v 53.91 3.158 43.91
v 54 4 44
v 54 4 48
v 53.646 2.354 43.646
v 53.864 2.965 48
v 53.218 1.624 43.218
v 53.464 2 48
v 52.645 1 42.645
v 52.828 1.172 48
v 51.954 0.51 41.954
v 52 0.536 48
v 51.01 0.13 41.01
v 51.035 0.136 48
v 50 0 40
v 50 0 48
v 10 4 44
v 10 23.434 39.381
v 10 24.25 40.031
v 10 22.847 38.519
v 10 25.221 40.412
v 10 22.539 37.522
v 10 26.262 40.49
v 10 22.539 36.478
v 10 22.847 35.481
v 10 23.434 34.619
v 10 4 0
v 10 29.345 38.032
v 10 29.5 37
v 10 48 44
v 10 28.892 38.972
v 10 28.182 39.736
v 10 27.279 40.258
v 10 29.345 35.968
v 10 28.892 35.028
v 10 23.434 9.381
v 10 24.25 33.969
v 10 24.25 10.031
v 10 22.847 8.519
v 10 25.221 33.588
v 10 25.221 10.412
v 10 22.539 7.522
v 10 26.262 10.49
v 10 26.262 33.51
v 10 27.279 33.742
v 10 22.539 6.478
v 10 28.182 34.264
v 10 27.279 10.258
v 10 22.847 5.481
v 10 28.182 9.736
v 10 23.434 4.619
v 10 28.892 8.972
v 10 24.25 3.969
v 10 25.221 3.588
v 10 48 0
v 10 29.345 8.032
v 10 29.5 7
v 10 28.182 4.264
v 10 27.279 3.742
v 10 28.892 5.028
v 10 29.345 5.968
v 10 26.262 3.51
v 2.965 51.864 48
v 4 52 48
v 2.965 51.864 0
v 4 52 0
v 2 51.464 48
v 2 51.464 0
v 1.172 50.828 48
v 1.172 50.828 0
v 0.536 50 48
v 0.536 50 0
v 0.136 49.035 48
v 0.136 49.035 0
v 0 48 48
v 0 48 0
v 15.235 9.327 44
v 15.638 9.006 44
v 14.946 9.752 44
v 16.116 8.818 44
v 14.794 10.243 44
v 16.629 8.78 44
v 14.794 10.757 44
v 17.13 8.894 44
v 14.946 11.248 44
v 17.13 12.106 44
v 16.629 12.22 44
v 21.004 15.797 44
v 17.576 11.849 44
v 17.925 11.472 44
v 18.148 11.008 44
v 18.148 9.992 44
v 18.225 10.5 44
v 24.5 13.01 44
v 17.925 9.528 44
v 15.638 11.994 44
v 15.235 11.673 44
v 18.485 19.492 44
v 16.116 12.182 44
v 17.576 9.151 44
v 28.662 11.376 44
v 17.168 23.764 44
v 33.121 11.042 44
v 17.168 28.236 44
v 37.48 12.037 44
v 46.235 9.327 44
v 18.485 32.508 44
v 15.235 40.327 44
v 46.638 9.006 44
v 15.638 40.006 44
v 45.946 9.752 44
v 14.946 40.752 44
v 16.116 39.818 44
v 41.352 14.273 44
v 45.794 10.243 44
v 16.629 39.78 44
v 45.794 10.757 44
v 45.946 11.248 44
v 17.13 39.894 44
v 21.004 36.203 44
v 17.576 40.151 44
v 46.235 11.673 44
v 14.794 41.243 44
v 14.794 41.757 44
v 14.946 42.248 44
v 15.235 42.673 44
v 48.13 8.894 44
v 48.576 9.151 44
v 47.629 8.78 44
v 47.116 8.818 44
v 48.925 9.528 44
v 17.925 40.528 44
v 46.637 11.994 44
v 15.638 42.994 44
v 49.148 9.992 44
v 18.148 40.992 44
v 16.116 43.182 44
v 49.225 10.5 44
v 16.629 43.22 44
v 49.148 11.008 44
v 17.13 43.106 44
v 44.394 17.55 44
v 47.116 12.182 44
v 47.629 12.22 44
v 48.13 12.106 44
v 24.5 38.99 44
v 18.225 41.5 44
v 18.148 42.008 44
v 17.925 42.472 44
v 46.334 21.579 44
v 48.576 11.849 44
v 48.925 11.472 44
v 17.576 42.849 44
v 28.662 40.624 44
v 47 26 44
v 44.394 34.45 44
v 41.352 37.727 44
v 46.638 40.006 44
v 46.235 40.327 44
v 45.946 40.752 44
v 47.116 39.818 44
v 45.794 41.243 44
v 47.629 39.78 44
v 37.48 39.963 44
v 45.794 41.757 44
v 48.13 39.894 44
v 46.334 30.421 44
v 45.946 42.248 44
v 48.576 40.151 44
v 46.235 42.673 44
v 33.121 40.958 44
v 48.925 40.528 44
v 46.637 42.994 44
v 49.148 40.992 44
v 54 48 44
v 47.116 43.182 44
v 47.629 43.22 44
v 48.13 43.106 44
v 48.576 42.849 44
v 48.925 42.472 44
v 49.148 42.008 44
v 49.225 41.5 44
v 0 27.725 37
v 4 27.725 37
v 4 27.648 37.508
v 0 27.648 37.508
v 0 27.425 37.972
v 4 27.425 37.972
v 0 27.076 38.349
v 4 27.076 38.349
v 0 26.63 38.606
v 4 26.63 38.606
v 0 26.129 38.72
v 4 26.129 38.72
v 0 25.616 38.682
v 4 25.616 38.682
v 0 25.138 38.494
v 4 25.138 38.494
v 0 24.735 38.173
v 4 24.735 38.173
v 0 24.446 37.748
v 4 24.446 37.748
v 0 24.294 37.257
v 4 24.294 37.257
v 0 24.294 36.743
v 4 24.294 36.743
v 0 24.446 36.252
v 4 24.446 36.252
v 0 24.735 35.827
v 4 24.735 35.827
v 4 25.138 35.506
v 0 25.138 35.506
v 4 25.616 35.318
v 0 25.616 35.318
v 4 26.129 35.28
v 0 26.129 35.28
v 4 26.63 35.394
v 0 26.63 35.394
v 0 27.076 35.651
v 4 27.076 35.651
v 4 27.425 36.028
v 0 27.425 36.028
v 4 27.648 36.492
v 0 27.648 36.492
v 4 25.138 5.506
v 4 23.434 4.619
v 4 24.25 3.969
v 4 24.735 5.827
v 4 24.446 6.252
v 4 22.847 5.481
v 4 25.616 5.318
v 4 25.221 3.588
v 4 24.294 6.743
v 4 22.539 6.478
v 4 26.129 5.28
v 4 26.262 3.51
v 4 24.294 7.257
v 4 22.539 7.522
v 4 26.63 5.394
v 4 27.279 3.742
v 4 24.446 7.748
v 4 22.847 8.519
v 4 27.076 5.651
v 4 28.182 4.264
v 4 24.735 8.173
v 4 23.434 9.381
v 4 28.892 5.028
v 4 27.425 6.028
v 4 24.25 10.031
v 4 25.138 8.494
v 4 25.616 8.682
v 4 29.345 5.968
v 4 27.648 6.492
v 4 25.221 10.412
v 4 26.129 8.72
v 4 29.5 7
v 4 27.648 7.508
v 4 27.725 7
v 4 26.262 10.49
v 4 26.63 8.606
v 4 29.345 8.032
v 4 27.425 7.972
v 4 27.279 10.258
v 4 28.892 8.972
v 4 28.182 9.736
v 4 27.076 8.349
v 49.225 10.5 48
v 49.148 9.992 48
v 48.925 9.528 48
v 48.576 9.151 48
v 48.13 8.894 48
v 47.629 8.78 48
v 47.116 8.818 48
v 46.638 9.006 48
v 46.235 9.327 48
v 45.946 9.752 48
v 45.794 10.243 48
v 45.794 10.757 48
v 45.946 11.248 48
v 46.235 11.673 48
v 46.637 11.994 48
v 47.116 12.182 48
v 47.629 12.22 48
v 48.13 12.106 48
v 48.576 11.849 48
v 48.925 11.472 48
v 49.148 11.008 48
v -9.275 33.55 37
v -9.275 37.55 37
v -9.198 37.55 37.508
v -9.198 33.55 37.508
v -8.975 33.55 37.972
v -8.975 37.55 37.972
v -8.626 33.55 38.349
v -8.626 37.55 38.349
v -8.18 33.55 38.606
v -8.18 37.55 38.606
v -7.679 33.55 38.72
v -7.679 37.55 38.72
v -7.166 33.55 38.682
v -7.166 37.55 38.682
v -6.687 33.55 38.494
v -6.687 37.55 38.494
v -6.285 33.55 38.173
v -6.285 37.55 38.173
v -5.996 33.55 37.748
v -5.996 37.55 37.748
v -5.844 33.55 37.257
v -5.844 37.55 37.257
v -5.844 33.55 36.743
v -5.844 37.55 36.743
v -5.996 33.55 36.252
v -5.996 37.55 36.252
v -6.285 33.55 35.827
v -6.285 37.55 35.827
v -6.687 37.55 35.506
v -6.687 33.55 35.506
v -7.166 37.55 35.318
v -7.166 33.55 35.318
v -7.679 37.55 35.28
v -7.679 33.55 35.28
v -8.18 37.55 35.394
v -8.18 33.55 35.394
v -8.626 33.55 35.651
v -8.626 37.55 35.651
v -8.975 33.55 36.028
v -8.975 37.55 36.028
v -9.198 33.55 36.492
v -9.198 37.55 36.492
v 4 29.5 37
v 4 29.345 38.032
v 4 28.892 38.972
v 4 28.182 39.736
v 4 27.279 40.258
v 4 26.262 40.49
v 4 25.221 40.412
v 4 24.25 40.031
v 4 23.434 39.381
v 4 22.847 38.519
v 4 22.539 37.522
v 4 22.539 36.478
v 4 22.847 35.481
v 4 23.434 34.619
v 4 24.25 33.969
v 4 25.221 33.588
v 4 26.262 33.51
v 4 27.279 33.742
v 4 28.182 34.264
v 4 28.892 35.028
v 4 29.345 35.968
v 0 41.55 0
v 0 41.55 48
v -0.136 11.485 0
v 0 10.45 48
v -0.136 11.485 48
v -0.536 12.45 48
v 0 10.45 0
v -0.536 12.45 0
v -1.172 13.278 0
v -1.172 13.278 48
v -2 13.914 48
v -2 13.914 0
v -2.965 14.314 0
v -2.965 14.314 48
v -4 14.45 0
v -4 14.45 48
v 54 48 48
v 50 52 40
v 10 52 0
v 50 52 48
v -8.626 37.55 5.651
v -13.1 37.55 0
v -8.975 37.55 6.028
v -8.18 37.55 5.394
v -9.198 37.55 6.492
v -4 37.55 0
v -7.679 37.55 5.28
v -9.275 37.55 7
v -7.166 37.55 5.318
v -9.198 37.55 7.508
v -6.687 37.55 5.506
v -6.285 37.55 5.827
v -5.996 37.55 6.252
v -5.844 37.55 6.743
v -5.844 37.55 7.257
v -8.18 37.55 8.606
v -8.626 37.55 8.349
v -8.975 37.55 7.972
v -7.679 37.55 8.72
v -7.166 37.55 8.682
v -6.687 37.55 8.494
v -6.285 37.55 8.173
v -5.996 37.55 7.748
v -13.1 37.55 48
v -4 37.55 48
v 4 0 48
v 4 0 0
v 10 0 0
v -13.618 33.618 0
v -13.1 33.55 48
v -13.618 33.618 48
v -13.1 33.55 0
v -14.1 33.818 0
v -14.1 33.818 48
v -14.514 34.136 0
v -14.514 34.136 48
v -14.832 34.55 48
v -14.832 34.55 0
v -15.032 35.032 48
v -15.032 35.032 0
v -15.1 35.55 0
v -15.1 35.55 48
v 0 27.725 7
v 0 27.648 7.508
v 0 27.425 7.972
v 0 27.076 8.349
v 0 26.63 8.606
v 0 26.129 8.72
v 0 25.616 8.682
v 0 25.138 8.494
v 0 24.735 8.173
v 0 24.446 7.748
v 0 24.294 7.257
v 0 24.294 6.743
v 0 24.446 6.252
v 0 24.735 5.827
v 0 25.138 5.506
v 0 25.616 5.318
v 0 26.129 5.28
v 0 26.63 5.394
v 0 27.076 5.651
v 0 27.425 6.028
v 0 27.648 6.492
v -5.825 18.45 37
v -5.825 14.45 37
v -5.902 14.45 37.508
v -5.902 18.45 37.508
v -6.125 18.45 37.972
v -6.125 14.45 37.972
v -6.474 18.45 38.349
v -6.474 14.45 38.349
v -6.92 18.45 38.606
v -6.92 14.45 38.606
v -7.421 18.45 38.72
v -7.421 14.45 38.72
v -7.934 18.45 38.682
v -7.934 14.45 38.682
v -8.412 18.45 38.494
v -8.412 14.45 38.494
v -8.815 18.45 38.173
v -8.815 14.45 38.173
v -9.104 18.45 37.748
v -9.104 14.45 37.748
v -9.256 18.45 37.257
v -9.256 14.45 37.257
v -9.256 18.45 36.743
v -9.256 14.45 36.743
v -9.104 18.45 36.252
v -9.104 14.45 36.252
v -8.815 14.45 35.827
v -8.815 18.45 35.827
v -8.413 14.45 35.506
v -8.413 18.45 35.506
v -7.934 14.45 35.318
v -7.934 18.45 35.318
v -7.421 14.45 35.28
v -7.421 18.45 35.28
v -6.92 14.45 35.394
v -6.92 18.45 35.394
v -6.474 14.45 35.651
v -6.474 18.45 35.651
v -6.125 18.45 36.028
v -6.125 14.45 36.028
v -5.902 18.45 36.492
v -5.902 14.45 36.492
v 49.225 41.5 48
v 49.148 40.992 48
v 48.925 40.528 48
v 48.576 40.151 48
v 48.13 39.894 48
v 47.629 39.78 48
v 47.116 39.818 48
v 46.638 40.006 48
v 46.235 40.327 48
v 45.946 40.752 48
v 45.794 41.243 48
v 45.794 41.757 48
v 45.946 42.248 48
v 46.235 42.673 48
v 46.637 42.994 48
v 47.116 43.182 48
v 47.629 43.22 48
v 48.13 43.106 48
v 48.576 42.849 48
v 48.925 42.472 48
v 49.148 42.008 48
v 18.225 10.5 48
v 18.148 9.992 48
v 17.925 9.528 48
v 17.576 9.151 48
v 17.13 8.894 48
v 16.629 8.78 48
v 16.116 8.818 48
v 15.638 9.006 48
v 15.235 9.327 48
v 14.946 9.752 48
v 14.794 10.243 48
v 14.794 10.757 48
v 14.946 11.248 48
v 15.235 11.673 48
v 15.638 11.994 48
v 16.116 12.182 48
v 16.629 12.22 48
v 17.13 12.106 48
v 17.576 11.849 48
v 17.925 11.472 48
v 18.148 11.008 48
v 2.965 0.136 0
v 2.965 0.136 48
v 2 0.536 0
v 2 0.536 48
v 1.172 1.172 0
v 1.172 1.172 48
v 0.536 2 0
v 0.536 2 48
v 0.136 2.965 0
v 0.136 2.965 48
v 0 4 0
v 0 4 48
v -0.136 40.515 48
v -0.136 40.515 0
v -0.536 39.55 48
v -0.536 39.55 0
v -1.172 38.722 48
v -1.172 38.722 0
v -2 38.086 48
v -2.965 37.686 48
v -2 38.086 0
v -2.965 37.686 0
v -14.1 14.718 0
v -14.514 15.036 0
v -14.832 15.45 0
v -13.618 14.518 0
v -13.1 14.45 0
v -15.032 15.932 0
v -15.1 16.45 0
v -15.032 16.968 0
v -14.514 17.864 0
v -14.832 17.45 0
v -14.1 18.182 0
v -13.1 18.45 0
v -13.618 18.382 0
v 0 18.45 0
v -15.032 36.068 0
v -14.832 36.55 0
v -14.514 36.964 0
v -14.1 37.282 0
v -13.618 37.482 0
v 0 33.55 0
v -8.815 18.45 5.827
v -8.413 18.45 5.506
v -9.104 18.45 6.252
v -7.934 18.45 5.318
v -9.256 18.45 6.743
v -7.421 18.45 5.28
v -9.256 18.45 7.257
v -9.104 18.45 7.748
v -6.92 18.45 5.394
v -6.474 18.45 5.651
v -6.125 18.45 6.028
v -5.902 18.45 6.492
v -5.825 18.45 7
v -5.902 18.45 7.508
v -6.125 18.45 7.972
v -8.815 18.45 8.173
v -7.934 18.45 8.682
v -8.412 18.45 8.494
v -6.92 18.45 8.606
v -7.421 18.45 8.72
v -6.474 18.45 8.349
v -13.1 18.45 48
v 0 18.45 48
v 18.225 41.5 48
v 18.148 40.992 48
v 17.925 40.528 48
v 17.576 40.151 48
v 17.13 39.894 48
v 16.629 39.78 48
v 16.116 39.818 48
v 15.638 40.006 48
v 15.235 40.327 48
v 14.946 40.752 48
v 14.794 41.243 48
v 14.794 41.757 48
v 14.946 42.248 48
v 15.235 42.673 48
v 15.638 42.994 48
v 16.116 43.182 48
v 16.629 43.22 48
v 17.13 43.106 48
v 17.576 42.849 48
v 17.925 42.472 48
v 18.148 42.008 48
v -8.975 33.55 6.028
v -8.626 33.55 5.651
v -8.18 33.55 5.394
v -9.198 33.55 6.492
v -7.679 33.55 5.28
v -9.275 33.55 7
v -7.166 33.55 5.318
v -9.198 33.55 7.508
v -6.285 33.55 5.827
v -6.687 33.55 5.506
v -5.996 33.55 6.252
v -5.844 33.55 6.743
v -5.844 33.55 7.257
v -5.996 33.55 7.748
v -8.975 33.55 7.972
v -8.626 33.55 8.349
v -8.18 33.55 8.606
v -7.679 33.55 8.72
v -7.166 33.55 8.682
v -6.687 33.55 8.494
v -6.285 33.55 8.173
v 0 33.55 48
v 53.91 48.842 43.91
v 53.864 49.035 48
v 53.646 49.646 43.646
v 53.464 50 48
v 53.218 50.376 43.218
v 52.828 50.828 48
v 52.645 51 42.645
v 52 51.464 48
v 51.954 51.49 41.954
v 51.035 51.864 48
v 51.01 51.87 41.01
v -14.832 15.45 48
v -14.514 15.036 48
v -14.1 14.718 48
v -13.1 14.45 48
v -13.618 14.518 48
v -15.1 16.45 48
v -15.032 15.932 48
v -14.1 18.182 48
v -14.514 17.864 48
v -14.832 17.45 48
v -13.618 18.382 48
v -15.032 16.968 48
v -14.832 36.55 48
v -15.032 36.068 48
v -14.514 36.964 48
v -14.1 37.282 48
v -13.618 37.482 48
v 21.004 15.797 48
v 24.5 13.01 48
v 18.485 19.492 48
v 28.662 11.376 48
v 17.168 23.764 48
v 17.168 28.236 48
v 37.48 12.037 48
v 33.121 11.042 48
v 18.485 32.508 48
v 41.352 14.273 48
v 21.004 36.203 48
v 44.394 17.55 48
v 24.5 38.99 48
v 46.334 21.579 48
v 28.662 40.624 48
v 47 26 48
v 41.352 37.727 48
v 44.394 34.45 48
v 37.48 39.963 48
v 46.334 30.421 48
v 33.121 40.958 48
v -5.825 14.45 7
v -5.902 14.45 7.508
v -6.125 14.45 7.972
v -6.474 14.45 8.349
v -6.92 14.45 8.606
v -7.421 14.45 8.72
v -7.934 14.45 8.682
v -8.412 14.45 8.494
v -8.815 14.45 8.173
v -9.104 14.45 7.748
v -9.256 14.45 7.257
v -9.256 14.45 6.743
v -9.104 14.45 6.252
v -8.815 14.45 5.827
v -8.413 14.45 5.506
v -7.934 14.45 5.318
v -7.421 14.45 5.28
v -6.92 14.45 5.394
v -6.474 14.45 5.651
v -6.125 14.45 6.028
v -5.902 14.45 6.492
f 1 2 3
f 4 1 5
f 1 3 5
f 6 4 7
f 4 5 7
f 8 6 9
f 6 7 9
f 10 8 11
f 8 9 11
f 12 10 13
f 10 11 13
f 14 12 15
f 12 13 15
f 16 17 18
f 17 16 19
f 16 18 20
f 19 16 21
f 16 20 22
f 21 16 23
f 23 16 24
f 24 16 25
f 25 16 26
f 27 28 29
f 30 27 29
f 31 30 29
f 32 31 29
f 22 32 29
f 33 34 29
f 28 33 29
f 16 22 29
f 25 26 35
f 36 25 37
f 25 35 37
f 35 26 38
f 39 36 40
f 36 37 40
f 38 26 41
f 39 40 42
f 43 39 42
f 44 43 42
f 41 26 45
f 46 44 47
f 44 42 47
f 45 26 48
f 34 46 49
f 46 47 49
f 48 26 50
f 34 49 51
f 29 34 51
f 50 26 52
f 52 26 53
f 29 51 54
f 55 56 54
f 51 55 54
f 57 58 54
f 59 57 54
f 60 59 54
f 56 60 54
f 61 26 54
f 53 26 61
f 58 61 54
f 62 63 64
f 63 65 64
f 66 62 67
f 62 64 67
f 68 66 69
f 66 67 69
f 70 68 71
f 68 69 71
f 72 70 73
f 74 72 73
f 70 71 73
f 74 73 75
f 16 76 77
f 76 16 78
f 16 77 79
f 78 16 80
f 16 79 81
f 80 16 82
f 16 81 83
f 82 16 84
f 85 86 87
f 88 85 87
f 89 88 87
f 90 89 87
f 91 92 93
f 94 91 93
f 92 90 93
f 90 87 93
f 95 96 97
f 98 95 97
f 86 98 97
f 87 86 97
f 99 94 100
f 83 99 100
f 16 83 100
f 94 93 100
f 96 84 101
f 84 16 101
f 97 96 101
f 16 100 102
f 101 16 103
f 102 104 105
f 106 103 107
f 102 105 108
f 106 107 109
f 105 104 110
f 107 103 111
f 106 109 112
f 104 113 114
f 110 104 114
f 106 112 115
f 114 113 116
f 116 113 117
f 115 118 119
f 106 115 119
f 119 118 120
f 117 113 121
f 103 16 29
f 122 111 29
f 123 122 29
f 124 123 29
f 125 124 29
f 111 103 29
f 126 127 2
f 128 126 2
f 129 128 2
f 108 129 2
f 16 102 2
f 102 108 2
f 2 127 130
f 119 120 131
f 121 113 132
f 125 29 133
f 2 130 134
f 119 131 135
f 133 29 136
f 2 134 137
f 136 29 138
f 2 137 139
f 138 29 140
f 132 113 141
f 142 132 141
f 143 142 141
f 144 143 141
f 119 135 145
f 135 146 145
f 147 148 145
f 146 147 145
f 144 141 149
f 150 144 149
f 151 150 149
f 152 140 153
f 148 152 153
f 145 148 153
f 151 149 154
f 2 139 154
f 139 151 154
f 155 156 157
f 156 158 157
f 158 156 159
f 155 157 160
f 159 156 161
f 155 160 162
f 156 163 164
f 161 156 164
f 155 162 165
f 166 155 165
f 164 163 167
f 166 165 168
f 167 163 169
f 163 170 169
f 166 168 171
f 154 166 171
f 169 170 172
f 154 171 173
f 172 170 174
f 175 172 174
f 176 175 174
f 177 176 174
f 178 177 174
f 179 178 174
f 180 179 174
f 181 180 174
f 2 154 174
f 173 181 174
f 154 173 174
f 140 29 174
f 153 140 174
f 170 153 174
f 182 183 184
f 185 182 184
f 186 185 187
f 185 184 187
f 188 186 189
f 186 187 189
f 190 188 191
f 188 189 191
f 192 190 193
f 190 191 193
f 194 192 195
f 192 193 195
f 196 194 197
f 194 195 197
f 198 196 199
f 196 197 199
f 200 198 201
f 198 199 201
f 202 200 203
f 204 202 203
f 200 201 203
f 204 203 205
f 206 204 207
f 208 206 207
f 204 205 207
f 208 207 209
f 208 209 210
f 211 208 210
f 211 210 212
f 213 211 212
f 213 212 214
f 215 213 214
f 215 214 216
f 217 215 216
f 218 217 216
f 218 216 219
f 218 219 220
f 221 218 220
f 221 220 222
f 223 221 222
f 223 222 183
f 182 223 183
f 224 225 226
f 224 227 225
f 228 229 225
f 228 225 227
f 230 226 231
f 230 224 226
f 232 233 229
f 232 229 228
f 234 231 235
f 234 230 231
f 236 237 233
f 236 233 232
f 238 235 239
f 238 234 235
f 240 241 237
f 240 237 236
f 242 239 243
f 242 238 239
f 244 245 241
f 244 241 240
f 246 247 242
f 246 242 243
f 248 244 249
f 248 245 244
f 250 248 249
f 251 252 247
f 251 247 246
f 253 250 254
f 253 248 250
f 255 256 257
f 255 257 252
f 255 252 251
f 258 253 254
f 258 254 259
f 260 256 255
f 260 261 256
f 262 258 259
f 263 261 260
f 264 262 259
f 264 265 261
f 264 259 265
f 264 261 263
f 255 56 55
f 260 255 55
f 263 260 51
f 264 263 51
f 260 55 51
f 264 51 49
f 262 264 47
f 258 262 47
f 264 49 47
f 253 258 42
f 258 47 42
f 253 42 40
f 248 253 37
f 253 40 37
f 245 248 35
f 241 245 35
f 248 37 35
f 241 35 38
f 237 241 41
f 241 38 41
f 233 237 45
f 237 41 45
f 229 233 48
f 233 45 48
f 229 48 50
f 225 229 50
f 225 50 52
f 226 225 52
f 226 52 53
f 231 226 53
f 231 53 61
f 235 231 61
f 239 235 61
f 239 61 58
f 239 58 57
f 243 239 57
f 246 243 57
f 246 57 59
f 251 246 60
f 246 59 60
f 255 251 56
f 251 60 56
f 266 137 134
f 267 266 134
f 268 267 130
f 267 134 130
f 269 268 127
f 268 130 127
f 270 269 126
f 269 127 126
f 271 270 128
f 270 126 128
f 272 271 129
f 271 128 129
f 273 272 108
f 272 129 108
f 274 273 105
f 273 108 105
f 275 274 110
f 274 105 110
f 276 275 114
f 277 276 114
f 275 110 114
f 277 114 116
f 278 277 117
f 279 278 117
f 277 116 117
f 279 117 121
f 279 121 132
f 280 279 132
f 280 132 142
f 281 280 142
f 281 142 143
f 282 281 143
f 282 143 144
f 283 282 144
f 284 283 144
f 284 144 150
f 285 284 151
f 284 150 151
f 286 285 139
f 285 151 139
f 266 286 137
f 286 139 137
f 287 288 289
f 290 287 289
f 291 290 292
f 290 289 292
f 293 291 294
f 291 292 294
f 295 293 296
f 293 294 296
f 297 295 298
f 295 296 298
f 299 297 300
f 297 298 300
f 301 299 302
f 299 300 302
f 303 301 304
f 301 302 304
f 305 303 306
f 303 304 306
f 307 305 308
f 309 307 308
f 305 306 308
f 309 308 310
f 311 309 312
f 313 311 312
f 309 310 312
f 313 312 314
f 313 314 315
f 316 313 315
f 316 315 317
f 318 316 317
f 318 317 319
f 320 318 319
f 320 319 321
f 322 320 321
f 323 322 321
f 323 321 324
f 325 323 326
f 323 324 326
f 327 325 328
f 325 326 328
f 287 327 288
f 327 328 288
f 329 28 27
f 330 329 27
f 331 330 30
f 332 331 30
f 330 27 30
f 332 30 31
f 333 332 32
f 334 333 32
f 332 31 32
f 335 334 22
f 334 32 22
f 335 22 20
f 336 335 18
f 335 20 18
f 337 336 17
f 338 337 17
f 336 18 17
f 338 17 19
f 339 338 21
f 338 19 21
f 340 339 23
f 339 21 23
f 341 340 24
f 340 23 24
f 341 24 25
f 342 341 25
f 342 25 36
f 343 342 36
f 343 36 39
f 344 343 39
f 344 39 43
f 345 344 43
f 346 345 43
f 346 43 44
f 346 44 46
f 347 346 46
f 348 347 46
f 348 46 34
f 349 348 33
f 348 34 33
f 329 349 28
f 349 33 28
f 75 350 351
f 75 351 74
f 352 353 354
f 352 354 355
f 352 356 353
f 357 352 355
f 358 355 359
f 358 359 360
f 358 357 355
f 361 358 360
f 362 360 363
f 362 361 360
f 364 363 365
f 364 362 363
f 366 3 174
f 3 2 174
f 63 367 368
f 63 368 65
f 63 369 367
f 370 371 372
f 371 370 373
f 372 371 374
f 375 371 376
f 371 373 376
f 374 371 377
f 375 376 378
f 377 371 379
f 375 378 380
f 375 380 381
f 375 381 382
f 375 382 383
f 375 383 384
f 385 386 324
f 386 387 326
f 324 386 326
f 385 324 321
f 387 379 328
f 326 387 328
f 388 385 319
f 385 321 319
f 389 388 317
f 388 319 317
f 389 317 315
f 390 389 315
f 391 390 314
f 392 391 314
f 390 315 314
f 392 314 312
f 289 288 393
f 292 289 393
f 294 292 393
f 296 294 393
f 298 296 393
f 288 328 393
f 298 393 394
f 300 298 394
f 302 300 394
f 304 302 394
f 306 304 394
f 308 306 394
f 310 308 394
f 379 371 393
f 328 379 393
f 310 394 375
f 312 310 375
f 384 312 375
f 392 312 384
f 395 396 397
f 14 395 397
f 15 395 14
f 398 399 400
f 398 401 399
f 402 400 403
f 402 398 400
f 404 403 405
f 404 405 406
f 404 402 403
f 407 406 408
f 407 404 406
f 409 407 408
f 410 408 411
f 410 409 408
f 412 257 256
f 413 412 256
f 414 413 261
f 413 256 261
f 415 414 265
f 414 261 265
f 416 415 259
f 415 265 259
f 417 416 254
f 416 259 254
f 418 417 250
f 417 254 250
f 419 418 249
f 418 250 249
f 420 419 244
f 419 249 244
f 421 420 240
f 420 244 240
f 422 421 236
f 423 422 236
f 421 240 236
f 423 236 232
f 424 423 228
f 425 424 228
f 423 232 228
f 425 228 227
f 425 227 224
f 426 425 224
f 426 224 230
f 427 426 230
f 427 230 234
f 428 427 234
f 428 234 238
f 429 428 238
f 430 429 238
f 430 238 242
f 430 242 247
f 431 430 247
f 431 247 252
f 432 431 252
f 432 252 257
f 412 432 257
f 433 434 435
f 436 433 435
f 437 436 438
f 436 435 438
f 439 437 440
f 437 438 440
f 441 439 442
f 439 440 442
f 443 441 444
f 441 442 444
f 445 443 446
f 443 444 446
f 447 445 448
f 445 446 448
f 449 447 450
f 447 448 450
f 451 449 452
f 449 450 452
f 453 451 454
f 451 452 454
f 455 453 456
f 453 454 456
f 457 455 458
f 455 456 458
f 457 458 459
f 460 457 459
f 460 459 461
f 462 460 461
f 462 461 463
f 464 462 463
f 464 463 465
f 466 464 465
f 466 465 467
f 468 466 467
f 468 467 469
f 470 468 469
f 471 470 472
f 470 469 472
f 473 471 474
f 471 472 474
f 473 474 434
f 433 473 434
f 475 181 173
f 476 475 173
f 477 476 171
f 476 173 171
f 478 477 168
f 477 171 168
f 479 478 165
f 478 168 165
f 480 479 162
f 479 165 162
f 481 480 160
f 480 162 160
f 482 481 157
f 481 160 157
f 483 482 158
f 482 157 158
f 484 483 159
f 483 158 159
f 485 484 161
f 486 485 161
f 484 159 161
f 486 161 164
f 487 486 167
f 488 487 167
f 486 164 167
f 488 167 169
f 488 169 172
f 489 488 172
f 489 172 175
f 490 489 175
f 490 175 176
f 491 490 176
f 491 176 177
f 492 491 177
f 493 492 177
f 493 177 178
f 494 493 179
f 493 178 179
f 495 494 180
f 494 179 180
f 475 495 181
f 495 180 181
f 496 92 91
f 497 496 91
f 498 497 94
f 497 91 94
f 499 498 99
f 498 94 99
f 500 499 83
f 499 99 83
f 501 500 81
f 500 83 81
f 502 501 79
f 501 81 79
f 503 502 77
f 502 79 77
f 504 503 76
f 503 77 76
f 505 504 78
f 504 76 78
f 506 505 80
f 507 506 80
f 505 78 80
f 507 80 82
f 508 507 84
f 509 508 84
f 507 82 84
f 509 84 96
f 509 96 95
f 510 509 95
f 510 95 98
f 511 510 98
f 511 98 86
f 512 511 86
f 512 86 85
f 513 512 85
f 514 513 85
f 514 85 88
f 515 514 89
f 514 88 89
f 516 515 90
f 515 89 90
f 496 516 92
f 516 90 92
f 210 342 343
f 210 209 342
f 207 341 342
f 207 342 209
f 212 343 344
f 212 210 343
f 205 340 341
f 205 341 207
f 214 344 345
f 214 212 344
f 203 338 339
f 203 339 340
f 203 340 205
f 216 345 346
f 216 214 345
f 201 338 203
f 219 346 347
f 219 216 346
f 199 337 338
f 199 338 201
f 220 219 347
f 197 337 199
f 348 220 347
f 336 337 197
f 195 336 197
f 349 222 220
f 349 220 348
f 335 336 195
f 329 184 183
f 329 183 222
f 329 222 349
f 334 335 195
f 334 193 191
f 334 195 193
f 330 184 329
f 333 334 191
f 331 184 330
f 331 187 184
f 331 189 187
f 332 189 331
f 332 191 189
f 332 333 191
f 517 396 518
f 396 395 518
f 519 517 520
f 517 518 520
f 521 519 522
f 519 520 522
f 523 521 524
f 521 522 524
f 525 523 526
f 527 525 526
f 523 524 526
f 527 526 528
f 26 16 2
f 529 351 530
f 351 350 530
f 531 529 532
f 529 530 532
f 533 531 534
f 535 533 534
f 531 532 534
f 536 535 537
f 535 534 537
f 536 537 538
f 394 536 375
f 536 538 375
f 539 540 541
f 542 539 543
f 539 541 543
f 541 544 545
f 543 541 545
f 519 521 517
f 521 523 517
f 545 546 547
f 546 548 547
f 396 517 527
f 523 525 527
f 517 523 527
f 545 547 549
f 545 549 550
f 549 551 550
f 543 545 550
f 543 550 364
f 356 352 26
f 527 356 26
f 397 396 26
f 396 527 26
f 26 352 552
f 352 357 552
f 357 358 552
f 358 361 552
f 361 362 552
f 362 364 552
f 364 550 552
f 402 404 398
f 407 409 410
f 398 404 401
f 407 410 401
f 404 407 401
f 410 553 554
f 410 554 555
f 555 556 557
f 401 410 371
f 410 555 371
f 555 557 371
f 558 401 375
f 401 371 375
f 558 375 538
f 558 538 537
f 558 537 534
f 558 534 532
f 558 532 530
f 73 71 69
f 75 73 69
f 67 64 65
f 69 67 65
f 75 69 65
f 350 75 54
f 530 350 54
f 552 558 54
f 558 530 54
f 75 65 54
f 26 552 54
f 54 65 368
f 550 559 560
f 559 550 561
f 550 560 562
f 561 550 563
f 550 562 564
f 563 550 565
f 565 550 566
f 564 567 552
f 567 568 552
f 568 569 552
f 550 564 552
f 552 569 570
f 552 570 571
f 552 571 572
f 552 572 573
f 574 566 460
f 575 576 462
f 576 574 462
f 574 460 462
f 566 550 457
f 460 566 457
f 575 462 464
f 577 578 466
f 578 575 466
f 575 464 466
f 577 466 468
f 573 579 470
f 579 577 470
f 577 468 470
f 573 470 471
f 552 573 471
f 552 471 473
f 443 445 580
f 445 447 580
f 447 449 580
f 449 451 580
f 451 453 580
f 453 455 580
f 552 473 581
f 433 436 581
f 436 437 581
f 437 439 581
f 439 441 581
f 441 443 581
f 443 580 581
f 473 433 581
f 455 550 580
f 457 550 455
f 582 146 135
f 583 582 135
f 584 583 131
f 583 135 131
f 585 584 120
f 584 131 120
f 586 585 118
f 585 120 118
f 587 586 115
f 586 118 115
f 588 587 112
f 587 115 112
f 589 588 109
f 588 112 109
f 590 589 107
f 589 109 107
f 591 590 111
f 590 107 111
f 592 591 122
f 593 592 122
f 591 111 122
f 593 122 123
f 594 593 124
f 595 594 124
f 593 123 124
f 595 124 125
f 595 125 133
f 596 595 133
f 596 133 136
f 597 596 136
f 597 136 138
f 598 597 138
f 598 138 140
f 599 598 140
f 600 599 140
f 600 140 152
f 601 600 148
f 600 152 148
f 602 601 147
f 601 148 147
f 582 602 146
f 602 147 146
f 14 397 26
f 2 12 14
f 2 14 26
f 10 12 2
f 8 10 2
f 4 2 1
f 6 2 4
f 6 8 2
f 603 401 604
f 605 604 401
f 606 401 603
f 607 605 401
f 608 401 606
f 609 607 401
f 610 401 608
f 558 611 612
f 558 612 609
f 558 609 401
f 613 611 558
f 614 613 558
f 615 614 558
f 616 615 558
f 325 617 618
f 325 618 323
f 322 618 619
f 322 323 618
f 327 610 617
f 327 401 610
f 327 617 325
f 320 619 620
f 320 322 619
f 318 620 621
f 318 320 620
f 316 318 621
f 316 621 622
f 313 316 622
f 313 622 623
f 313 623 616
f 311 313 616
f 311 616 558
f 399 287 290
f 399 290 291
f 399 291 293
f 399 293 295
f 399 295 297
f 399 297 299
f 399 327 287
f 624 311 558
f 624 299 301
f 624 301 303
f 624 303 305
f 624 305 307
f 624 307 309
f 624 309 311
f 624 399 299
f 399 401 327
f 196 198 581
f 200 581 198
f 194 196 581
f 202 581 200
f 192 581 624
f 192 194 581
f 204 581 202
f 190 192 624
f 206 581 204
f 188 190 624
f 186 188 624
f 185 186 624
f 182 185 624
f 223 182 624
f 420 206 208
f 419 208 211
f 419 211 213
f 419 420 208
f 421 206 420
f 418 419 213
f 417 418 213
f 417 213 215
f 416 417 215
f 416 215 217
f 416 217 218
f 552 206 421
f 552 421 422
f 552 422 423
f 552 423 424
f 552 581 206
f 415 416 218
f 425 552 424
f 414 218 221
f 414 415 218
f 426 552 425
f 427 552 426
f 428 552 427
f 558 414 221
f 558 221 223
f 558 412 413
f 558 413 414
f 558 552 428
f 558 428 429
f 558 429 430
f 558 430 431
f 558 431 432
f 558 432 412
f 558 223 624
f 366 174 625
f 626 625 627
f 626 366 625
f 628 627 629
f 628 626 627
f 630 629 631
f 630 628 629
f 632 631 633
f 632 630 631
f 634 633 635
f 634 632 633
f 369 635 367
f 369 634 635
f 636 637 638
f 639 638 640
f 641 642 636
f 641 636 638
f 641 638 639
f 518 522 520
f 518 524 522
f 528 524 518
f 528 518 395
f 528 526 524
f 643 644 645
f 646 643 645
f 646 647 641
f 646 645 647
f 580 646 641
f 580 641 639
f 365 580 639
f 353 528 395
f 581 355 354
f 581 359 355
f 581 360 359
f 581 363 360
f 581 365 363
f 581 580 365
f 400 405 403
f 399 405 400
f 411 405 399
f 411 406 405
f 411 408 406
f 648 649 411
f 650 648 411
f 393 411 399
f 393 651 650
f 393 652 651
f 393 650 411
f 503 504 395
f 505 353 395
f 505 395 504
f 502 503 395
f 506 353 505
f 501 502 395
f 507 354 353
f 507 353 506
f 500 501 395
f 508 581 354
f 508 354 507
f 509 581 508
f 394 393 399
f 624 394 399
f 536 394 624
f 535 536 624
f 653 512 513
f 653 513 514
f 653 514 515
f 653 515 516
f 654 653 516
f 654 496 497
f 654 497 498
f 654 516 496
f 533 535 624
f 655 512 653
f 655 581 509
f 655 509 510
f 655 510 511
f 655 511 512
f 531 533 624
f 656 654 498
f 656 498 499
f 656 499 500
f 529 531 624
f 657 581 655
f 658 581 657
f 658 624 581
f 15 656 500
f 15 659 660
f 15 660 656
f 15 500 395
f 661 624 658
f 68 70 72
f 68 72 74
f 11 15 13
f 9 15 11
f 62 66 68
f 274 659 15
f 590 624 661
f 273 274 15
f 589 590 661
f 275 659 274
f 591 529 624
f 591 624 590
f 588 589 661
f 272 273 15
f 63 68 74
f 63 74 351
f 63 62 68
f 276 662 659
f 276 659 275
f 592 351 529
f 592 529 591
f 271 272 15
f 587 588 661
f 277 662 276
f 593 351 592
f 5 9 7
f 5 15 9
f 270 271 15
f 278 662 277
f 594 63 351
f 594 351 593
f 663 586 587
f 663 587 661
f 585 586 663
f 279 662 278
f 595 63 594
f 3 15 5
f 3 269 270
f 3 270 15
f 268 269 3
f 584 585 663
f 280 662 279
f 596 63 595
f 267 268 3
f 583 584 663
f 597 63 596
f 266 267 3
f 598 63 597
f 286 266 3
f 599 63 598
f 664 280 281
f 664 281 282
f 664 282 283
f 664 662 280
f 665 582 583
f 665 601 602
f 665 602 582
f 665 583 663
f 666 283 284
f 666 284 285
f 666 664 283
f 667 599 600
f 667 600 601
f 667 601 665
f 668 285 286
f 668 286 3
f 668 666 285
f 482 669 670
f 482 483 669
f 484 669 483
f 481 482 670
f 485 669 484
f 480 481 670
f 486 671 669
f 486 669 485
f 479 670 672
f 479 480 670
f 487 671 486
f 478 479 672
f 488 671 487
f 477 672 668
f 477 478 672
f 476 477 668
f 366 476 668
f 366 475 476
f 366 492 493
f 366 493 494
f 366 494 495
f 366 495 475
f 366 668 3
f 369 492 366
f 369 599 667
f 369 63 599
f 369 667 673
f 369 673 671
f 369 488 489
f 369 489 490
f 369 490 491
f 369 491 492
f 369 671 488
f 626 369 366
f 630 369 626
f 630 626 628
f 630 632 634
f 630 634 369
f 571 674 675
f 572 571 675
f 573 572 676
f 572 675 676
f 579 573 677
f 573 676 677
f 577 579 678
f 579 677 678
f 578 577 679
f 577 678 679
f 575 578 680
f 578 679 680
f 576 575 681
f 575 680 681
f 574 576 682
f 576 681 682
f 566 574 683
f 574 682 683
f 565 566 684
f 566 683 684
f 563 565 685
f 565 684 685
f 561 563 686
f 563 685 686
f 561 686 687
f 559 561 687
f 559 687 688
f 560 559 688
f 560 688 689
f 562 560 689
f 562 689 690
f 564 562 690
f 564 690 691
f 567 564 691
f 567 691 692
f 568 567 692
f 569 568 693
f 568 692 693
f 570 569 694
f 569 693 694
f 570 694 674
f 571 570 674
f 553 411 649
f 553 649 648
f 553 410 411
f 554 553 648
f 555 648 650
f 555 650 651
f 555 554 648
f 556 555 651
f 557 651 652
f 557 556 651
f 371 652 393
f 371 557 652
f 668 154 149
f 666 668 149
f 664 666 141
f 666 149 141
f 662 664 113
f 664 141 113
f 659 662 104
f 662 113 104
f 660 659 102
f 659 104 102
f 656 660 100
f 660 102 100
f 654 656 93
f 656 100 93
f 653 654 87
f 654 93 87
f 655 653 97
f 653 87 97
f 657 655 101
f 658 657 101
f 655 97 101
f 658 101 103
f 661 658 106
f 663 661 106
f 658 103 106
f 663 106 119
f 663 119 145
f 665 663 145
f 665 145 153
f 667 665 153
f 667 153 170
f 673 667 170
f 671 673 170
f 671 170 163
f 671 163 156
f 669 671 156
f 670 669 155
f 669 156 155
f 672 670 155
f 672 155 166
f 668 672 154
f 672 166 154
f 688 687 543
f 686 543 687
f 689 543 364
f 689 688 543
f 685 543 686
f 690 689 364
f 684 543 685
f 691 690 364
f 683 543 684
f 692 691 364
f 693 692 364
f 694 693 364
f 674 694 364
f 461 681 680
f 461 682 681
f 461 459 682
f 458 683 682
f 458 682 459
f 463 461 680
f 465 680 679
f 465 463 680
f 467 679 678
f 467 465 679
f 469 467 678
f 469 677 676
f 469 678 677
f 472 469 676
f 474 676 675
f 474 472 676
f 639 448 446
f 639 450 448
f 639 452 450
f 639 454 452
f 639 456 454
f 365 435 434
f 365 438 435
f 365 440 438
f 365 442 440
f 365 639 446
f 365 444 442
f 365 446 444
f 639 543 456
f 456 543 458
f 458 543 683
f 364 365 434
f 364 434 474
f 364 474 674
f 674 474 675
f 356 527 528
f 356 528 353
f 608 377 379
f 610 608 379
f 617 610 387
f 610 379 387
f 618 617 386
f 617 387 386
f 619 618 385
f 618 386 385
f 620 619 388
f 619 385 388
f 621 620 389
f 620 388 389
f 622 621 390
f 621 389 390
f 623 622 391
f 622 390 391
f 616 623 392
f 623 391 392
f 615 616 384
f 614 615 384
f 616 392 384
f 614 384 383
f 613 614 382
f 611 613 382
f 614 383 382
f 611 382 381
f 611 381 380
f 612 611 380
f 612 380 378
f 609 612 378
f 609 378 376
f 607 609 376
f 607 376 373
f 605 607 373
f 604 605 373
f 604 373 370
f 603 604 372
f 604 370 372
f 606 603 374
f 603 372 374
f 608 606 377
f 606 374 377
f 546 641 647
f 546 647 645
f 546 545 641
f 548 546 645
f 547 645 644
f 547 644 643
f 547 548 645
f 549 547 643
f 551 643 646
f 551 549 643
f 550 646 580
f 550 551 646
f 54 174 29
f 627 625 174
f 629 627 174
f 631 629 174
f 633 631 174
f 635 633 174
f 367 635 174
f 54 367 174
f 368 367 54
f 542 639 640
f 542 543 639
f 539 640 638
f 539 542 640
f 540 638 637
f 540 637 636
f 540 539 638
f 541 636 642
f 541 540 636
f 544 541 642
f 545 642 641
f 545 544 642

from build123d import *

# Parameters (mm, degrees)
F0_W      = 10
F0_H      = 52
F1_DEPTH  = 44
F2_W      = 54
F2_H      = 52
F3_DEPTH  = 4
F5_DEPTH  = 4
F7_DEPTH  = 4
F8_R      = 15
F8_R_2    = 1.725
F9_DEPTH  = 4
F10_R     = 1.725
F11_DEPTH = 10
F10_R_2   = 3.5
F12_DEPTH = 6
F14_W     = 15.1
F14_H     = 4
F15_DEPTH = 48
F16_R     = 1.725
F17_DEPTH = 4
F18_R     = 1.725
F19_DEPTH = 4
F20_R     = 4
F21_R     = 1.99999


# Not quite as in the source:
# - a fillet or chamfer is up to 0.001 mm smaller than in the source, because OpenCascade refuses the exact size
# - a feature of the source that left no trace in its solid (it failed there, or was rolled back) is left out
# - a feature names something its author has since deleted; it is built from what else it names


with BuildPart() as f1:
    # F0 (on Top) → F1 (new body)
    with BuildSketch(Plane.XY):
        with Locations((5, 26)):
            Rectangle(F0_W, F0_H)
    extrude(amount=F1_DEPTH)

    # F2 (on face) → F3 (join)
    with BuildSketch(Plane.XY.offset(44)):
        with Locations((27, 26)):
            Rectangle(F2_W, F2_H)
    extrude(amount=F3_DEPTH)

    # F4 (on face) → F5 (join)
    with BuildSketch(Plane.XZ):
        Polygon((10, 0), (54, 44), (10, 44), align=None)
    extrude(amount=-F5_DEPTH)

    # F6 (on face) → F7 (join)
    with BuildSketch(Plane(origin=(0, 52, 0), x_dir=(-1, 0, 0), z_dir=(0, 1, 0))):
        Polygon((-10, 44), (-54, 44), (-10, 0), align=None)
    extrude(amount=-F7_DEPTH)

    # F8 (on face) → F9 (cut, through all)
    with BuildSketch(Plane(origin=(0, 0, 44), x_dir=(1, 0, 0), z_dir=(0, 0, -1))):
        with Locations((32, -26)):
            Circle(F8_R)
        with Locations((16.5, -10.5)):
            Circle(F8_R_2)
        with Locations((47.5, -10.5)):
            Circle(F8_R_2)
        with Locations((47.5, -41.5)):
            Circle(F8_R_2)
        with Locations((16.5, -41.5)):
            Circle(F8_R_2)
    extrude(amount=-F9_DEPTH, mode=Mode.SUBTRACT)

    # F10 (on face) → F11 (cut)
    with BuildSketch(Plane.YZ.offset(10)):
        with Locations((26, 37)):
            Circle(F10_R)
        with Locations((26, 7)):
            Circle(F10_R)
    extrude(amount=-F11_DEPTH, mode=Mode.SUBTRACT)

    # F10 (on face) → F12 (cut)
    with BuildSketch(Plane.YZ.offset(10)):
        with Locations((26, 37)):
            Circle(F10_R_2)
        with Locations((26, 37)):
            Circle(F10_R, mode=Mode.SUBTRACT)
        with Locations((26, 7)):
            Circle(F10_R_2)
        with Locations((26, 7)):
            Circle(F10_R, mode=Mode.SUBTRACT)
    extrude(amount=-F12_DEPTH, mode=Mode.SUBTRACT)

    # F14 (on face) → F15 (join)
    with BuildSketch(Plane.XY.offset(48)):
        with Locations((-7.55, 35.55)):
            Rectangle(F14_W, F14_H)
        with Locations((-7.55, 16.45)):
            Rectangle(F14_W, F14_H)
    extrude(amount=-F15_DEPTH)

    # F16 (on face) → F17 (cut, through all)
    with BuildSketch(Plane.XZ.offset(-14.45)):
        with Locations((-7.55, 37)):
            Circle(F16_R)
        with Locations((-7.55, 7)):
            Circle(F16_R)
    extrude(amount=-F17_DEPTH, mode=Mode.SUBTRACT)

    # F18 (on face) → F19 (cut, through all)
    with BuildSketch(Plane(origin=(0, 37.55, 0), x_dir=(-1, 0, 0), z_dir=(0, 1, 0))):
        with Locations((7.55, 37)):
            Circle(F18_R)
        with Locations((7.55, 7)):
            Circle(F18_R)
    extrude(amount=-F19_DEPTH, mode=Mode.SUBTRACT)

    # F20
    f20_edges = [f1.edges().sort_by_distance(p)[0] for p in [
        (0, 14.45, 24),
        (0, 37.55, 24),
        (0, 52, 24),
        (54, 52, 46),
        (54, 0, 46),
        (0, 0, 24),
    ]]
    fillet(f20_edges, radius=F20_R)

    # F21 (radius 2 in the source; OpenCascade refuses exactly that, so slightly less here)
    f21_edges = [f1.edges().sort_by_distance(p)[0] for p in [
        (-15.1, 37.55, 24),
        (-15.1, 33.55, 24),
        (-15.1, 18.45, 24),
        (-15.1, 14.45, 24),
    ]]
    fillet(f21_edges, radius=F21_R)


solid = f1.part
